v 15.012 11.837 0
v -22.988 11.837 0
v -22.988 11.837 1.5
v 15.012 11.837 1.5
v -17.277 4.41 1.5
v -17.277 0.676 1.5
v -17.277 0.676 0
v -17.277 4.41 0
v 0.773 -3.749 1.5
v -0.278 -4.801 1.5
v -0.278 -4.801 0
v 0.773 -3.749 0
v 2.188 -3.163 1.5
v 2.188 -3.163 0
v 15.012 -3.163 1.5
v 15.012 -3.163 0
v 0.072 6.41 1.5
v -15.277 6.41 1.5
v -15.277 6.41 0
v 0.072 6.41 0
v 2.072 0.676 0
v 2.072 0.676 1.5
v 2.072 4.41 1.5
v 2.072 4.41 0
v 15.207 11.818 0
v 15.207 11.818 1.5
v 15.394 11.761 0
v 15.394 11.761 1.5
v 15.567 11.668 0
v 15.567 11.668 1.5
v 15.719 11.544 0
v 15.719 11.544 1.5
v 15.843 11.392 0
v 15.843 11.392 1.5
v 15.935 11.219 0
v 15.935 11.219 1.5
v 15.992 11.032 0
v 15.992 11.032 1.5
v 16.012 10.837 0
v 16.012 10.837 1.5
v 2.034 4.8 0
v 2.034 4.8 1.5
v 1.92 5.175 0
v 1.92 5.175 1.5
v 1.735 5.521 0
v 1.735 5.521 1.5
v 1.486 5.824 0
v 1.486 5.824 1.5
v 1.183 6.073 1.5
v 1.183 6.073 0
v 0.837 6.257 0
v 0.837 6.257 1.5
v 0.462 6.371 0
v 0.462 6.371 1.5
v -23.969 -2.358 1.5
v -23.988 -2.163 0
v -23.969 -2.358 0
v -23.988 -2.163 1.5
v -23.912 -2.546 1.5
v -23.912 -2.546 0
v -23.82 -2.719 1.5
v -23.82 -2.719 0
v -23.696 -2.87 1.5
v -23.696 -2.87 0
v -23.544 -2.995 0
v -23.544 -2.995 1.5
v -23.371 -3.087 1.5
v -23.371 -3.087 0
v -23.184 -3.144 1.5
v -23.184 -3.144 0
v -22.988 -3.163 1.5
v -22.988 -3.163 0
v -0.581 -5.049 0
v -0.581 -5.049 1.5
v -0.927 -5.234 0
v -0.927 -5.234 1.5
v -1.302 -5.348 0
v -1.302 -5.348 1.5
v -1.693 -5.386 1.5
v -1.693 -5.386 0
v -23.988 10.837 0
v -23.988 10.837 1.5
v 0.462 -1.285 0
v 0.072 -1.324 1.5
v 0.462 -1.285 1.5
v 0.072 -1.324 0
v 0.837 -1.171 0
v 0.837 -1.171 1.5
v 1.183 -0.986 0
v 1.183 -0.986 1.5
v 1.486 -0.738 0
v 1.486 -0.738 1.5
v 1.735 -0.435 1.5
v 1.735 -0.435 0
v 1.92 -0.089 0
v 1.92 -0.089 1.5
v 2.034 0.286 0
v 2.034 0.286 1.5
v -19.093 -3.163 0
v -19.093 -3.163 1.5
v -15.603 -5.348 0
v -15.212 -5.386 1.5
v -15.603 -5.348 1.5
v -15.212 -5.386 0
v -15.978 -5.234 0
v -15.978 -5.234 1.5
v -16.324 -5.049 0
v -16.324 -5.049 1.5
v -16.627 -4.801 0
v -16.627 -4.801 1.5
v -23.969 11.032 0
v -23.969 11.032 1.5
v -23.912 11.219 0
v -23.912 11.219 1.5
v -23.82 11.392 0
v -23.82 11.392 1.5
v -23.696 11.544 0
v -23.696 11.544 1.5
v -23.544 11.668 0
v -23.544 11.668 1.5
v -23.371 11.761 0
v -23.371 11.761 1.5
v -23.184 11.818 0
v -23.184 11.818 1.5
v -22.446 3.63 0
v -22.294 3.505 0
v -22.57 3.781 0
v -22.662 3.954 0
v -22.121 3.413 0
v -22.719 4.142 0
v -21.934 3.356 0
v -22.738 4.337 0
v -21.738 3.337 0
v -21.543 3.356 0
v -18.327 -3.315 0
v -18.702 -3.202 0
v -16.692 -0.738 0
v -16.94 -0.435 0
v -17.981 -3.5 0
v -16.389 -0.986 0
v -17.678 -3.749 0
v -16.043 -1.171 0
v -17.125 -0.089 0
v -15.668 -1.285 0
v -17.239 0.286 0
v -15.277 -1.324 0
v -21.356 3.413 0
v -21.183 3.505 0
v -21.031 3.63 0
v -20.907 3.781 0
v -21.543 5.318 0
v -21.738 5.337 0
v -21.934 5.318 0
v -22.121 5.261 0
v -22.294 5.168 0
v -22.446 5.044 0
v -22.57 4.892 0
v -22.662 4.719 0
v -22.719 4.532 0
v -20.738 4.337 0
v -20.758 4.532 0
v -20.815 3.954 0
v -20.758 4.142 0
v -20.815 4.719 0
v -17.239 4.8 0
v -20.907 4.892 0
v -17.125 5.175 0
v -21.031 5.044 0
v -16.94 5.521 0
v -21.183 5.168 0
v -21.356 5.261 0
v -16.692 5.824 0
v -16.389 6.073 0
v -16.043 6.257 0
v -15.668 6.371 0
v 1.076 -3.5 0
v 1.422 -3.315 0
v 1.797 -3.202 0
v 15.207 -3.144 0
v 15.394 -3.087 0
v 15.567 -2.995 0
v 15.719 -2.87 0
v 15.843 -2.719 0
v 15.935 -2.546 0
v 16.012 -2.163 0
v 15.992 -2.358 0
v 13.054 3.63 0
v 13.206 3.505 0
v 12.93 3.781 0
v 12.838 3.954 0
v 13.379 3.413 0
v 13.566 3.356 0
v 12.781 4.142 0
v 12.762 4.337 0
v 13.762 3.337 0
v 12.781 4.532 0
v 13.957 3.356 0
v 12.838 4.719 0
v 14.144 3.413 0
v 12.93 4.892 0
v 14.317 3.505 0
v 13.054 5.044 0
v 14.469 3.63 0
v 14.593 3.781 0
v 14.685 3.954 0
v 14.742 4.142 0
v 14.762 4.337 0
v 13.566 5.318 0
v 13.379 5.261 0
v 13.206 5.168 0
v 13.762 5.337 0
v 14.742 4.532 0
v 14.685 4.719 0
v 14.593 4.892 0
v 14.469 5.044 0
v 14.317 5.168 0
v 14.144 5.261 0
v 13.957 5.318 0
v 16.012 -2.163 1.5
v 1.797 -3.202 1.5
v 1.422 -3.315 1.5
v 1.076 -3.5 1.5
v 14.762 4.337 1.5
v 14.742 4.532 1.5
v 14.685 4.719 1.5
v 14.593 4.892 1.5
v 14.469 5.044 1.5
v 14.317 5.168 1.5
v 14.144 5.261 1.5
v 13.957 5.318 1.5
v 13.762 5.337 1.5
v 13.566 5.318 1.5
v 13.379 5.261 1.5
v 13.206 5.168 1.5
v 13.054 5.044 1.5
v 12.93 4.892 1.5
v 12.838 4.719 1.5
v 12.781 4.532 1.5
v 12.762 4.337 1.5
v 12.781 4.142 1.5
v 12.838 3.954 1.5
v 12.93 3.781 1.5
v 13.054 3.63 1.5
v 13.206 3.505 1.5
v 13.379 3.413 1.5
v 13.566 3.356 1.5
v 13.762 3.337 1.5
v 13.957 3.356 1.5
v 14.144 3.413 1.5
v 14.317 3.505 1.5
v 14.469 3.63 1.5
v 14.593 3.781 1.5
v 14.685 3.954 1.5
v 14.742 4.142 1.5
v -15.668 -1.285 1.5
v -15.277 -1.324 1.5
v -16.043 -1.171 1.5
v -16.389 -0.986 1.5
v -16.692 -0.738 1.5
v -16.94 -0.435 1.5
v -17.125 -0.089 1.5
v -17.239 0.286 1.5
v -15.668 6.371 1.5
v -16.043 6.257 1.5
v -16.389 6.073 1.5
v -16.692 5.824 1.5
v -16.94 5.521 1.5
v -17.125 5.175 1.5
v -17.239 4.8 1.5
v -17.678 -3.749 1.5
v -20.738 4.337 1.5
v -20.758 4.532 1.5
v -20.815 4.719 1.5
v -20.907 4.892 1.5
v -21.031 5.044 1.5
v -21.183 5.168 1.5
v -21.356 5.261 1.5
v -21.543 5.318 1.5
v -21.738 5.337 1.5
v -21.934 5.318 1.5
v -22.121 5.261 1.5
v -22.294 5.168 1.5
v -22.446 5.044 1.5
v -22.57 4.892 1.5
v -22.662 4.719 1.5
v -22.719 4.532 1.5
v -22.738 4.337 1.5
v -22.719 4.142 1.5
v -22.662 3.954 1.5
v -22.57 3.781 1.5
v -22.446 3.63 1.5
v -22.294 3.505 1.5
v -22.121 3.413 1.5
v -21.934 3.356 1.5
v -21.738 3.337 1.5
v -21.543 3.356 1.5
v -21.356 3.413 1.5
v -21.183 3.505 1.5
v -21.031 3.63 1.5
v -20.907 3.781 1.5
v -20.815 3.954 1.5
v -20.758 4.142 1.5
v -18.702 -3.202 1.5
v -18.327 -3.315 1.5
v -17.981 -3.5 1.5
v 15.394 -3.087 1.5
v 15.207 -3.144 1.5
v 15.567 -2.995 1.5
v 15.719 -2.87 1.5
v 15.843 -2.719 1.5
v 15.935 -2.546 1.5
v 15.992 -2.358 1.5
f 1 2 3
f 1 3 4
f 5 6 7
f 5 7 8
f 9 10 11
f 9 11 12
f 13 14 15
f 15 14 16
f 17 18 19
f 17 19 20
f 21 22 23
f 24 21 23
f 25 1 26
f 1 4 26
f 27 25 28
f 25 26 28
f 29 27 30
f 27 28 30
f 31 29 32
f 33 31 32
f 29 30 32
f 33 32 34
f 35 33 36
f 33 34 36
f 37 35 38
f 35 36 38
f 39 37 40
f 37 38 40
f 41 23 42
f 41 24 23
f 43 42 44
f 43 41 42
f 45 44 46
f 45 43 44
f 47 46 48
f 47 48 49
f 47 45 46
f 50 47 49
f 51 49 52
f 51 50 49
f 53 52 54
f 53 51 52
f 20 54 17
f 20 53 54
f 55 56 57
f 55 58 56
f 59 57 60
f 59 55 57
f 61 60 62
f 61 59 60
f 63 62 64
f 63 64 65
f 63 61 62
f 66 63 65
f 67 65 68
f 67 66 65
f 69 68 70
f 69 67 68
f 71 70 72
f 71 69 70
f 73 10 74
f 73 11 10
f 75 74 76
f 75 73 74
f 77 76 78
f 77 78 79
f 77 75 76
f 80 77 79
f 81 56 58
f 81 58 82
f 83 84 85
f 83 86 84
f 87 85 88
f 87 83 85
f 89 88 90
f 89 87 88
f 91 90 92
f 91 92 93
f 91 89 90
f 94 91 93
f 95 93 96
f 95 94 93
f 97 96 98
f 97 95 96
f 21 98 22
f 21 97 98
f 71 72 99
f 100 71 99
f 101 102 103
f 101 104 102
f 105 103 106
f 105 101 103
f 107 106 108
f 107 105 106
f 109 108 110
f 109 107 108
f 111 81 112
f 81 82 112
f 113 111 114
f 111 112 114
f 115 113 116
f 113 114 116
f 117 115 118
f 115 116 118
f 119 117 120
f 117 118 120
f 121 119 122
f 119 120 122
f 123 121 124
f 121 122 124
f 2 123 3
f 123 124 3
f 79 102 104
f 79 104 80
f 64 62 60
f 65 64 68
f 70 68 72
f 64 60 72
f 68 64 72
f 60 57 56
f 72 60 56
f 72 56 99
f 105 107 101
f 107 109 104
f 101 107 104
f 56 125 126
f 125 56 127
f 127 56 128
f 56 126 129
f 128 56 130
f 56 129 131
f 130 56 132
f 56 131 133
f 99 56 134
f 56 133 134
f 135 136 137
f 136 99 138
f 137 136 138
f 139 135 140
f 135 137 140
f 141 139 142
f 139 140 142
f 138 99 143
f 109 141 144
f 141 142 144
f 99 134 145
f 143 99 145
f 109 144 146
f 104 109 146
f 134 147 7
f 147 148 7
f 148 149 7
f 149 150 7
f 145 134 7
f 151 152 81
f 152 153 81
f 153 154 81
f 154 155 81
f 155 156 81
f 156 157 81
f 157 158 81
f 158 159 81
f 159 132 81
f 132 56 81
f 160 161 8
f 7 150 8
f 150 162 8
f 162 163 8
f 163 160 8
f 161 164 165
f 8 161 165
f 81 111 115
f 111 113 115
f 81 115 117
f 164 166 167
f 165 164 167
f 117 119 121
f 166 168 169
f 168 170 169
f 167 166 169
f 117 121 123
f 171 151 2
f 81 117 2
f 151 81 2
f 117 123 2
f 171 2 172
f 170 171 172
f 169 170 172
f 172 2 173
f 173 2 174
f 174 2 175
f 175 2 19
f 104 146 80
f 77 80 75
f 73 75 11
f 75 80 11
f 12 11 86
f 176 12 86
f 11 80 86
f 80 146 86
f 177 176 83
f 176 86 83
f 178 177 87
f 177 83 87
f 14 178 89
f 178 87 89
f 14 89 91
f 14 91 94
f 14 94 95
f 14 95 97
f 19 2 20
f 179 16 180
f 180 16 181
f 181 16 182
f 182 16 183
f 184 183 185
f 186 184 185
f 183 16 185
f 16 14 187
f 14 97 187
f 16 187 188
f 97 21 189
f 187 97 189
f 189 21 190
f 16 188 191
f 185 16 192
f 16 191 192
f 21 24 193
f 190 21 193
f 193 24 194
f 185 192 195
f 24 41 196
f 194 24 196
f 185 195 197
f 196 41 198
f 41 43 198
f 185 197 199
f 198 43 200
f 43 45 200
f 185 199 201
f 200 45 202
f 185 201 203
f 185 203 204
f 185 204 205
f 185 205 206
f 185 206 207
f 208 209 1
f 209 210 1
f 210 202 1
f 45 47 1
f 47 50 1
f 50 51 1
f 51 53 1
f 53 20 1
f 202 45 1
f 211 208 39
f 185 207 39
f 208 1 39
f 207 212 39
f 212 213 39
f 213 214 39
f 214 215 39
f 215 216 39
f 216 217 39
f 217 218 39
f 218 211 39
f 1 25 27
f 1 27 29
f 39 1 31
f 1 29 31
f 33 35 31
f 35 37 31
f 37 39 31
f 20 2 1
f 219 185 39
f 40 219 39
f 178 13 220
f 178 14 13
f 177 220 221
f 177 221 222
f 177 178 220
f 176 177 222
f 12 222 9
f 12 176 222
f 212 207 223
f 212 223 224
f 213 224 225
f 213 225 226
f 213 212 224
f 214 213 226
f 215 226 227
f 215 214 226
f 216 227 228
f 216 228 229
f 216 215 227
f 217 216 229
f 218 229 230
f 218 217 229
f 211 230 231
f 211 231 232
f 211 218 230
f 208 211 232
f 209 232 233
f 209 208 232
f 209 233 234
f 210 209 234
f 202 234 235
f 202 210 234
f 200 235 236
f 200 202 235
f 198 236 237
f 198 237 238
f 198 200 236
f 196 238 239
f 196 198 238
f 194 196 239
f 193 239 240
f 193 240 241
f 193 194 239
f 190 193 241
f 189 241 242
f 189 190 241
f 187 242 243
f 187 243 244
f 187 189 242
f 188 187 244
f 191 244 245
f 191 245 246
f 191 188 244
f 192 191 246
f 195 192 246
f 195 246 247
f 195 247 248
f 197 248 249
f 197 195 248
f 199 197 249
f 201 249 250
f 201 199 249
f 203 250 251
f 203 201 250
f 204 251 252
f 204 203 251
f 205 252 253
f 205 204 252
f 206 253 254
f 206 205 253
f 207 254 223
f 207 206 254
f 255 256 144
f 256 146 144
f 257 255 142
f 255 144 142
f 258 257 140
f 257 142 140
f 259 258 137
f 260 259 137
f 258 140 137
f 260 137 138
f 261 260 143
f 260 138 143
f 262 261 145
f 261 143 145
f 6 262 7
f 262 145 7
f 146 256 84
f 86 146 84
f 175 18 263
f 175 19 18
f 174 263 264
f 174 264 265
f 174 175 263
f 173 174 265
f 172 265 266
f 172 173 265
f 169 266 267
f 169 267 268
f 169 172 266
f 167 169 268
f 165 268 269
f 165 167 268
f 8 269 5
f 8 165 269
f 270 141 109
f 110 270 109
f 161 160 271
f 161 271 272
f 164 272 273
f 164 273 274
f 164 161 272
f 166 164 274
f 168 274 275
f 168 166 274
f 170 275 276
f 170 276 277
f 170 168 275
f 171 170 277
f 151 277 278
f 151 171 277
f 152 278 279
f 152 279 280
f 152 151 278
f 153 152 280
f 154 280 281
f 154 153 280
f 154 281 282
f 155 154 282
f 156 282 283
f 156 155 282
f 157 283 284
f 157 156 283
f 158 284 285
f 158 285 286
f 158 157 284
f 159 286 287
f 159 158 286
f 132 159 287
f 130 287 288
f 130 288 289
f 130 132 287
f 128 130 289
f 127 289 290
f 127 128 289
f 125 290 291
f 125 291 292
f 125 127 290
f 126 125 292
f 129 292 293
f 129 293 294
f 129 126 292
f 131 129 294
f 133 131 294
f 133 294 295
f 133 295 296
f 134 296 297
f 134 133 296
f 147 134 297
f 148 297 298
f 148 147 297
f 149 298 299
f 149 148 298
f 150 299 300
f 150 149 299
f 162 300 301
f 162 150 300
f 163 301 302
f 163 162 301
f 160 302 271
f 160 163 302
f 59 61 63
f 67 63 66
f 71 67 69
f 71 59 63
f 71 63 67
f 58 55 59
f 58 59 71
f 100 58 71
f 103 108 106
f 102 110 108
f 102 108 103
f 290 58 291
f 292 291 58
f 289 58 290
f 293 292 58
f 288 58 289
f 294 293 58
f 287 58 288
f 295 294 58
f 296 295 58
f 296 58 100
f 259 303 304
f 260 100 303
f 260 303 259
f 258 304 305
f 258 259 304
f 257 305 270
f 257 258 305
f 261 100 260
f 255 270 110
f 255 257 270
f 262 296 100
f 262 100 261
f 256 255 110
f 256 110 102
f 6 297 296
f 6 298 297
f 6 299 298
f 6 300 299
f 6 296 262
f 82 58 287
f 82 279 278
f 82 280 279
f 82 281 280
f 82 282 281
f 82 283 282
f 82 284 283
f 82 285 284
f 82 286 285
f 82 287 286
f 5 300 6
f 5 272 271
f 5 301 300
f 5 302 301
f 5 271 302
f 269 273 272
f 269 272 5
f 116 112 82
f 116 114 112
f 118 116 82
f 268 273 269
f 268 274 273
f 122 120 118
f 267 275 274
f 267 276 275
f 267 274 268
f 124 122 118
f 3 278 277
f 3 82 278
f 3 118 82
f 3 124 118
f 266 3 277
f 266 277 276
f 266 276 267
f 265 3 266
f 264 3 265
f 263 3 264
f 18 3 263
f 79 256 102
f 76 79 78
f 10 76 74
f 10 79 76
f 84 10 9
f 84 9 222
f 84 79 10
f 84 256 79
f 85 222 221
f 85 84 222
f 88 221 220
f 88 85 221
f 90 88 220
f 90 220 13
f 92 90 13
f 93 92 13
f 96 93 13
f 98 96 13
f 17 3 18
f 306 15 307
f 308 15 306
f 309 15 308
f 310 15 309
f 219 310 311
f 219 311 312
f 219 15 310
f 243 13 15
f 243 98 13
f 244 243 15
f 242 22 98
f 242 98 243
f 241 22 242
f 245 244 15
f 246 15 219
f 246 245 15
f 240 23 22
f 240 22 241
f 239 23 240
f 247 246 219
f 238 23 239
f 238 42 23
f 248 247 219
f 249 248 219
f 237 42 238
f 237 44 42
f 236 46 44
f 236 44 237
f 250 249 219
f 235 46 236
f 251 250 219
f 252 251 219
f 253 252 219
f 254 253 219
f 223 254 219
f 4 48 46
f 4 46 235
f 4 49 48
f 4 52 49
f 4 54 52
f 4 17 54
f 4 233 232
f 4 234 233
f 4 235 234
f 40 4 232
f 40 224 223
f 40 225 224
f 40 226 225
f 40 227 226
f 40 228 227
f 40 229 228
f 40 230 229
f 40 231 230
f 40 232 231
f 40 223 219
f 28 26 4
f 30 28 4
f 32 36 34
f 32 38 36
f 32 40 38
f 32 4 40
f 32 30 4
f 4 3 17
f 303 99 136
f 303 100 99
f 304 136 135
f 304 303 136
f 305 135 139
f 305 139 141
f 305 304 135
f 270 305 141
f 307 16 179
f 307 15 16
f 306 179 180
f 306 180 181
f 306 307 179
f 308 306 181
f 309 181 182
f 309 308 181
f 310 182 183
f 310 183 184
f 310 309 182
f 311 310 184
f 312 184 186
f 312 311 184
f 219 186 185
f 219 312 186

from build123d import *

# Parameters (mm, degrees)
SKETCH_1_W          = 40
SKETCH_1_H          = 15
SKETCH_1_R          = 1
EXTRUDE_1_DEPTH     = 1.5
SKETCH_2_W          = 19.349402369
SKETCH_2_H          = 7.733193781
CUT_EXTRUDE_1_DEPTH = 1.5
FILLET_2_R          = 1
FILLET_3_R          = 2
EXTRUDE_2_DEPTH     = 1.5
FILLET_4_R          = 2


with BuildPart() as part:
    # 草图1 → 凸台-拉伸1 (new body)
    with BuildSketch(Plane.XY):
        with Locations((-3.988440653, 4.336799691)):
            Rectangle(SKETCH_1_W, SKETCH_1_H)
        with Locations((-21.738440653, 4.336799691)):
            Circle(SKETCH_1_R, mode=Mode.SUBTRACT)
        with Locations((13.761559347, 4.336799691)):
            Circle(SKETCH_1_R, mode=Mode.SUBTRACT)
    extrude(amount=EXTRUDE_1_DEPTH)

    # 草图2 → 切除-拉伸1 (cut)
    with BuildSketch(Plane.XY.offset(1.5)):
        with Locations((-7.602725981, 2.54307272)):
            Rectangle(SKETCH_2_W, SKETCH_2_H)
    extrude(amount=-CUT_EXTRUDE_1_DEPTH, mode=Mode.SUBTRACT)

    # 圆角2
    fillet_2_edges = [part.edges().sort_by_distance(p)[0] for p in [
        (16.011559347, -3.163200309, 0.75),
        (-23.988440653, -3.163200309, 0.75),
        (-23.988440653, 11.836799691, 0.75),
        (16.011559347, 11.836799691, 0.75),
    ]]
    fillet(fillet_2_edges, radius=FILLET_2_R)

    # 圆角3
    fillet_3_edges = [part.edges().sort_by_distance(p)[0] for p in [
        (2.071975204, 6.40966961, 0.75),
        (2.071975204, -1.323524171, 0.75),
        (-17.277427165, -1.323524171, 0.75),
        (-17.277427165, 6.40966961, 0.75),
    ]]
    fillet(fillet_3_edges, radius=FILLET_3_R)

    # 草图3 → 凸台-拉伸2 (add)
    with BuildSketch(Plane.XY.offset(1.5)):
        Polygon((-18.839640509, -2.587666371), (-16.040814973, -5.386491907), (-0.864084954, -5.386491907), (2.88813454, -1.634272413), align=None)
    extrude(amount=-EXTRUDE_2_DEPTH)

    # 圆角4
    fillet_4_edges = [part.edges().sort_by_distance(p)[0] for p in [
        (-18.26410657, -3.163200309, 0.75),
        (1.359206644, -3.163200309, 0.75),
        (-16.040814973, -5.386491907, 0.75),
        (-0.864084954, -5.386491907, 0.75),
    ]]
    fillet(fillet_4_edges, radius=FILLET_4_R)


solid = part.part
